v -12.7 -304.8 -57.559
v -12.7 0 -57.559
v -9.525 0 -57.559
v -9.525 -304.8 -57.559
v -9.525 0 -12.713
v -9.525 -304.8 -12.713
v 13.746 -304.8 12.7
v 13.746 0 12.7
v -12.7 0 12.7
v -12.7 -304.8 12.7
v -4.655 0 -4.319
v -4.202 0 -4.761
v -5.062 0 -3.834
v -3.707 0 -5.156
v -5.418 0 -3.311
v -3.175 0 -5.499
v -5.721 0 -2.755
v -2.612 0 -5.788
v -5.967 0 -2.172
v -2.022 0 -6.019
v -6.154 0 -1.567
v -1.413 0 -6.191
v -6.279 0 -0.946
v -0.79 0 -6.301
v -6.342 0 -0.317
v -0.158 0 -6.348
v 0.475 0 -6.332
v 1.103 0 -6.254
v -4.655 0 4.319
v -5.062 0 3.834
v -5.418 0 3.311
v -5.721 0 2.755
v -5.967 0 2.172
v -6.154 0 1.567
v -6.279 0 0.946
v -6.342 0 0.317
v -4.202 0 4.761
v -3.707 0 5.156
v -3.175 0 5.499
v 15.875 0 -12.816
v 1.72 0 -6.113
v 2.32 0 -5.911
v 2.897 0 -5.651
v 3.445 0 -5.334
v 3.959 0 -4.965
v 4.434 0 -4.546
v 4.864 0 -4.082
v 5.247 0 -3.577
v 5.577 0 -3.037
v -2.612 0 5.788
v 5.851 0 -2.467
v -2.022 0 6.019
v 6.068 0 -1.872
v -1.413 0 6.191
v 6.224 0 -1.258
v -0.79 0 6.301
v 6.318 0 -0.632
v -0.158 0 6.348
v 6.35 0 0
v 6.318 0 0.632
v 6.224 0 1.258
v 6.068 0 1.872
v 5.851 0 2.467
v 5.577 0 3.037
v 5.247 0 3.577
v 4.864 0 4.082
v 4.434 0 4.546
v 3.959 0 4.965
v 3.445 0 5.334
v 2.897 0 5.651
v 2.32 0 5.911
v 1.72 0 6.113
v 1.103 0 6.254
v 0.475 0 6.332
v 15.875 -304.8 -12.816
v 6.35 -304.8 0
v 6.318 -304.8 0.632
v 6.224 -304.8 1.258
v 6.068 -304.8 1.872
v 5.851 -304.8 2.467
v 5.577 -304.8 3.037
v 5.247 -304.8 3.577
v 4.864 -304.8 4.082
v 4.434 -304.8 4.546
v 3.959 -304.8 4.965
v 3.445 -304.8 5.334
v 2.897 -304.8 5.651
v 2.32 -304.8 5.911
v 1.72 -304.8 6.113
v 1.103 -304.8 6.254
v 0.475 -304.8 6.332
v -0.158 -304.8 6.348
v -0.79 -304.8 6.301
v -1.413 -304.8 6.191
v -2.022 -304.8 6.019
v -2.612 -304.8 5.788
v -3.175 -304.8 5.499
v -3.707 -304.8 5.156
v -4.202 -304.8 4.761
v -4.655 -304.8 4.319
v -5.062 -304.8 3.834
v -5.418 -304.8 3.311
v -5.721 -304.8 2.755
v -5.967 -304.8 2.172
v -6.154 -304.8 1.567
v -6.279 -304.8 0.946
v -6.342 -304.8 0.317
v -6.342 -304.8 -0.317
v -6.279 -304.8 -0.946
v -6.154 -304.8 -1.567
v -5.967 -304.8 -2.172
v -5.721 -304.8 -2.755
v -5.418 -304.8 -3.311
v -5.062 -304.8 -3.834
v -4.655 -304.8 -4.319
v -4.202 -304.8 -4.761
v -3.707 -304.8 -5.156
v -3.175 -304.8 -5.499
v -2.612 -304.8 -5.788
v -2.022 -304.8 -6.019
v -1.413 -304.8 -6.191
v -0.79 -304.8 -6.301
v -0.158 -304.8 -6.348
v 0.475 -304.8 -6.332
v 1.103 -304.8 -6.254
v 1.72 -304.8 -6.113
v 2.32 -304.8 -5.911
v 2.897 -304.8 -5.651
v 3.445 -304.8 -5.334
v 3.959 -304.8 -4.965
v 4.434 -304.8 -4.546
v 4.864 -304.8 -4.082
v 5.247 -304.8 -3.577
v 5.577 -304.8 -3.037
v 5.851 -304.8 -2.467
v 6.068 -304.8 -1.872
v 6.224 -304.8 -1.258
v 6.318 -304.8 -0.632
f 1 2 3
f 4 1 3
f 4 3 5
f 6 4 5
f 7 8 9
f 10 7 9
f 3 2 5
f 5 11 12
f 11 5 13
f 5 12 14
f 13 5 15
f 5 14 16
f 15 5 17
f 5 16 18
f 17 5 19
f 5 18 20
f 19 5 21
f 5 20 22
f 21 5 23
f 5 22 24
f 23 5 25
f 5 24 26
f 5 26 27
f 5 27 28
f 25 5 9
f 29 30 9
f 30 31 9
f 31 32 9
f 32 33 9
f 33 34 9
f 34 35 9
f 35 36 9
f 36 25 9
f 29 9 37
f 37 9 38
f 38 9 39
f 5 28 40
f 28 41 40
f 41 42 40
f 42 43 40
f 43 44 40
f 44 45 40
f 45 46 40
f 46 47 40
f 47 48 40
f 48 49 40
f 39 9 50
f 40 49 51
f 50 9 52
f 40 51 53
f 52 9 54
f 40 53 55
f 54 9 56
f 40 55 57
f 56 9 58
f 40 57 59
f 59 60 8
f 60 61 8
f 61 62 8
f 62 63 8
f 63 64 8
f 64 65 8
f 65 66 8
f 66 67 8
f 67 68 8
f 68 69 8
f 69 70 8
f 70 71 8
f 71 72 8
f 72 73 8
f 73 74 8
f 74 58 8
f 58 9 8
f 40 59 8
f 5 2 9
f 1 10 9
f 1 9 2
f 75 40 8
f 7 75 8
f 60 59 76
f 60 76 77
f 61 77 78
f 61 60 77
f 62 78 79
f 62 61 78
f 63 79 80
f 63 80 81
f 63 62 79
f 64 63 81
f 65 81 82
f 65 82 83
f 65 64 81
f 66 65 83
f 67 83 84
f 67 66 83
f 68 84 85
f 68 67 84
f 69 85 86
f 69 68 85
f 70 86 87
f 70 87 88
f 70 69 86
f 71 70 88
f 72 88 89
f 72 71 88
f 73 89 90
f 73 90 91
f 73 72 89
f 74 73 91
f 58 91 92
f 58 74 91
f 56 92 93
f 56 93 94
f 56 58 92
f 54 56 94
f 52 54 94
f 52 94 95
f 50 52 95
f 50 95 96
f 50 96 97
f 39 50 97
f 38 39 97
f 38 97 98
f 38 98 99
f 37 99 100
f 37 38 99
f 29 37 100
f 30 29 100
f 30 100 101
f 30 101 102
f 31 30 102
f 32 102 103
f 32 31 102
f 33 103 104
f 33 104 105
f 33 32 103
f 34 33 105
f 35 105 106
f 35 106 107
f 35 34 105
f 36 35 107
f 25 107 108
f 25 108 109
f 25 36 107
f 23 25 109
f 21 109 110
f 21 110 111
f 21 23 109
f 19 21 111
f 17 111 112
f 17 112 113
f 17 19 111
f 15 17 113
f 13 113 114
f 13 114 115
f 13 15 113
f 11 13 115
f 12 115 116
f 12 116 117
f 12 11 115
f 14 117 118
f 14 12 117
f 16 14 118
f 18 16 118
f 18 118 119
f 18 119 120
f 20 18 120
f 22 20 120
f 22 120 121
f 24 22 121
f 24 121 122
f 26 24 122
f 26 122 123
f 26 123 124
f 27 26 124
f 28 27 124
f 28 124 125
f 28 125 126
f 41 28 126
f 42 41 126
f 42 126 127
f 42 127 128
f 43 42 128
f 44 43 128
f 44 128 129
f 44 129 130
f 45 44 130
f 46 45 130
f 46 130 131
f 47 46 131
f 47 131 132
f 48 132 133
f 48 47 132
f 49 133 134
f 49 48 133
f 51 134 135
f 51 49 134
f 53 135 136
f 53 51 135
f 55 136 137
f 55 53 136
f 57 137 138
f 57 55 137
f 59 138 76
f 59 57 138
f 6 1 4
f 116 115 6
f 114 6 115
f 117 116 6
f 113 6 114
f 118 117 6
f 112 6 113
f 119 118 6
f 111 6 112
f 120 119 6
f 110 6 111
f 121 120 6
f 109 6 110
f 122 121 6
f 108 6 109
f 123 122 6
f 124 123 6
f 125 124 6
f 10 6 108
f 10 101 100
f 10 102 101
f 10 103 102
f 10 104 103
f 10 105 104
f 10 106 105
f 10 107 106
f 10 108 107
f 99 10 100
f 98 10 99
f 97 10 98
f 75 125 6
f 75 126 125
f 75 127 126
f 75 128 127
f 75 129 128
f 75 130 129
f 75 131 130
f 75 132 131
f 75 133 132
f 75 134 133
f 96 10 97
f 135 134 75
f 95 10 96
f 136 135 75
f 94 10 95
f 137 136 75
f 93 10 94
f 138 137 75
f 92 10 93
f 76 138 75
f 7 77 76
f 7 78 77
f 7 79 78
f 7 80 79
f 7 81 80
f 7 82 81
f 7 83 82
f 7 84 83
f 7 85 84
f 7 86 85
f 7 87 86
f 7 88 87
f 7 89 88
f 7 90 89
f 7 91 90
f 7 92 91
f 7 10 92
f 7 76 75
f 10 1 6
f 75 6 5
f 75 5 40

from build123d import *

# Parameters (mm, degrees)
F0_R     = 6.35
F1_DEPTH = 304.8


# Not quite as in the source:
# - a feature names something its author has since deleted; it is built from what else it names


with BuildPart() as f1:
    # F0 (on Front) → F1 (new body)
    with BuildSketch(Plane.XZ):
        Polygon((-9.525, -12.7128391741), (-12.7, -12.7), (-12.7, -57.5586806671), (-9.525, -57.5586806671), align=None)
        Polygon((15.8747663651, -12.8155516218), (13.7463785204, 12.7), (-12.7, 12.7), (-12.7, -12.7), (-9.525, -12.7), (-9.525, -12.7128391741), align=None)
        Circle(F0_R, mode=Mode.SUBTRACT)
        Polygon((-9.525, -12.7), (-12.7, -12.7), (-9.525, -12.7128391741), align=None)
    extrude(amount=F1_DEPTH)


solid = f1.part
